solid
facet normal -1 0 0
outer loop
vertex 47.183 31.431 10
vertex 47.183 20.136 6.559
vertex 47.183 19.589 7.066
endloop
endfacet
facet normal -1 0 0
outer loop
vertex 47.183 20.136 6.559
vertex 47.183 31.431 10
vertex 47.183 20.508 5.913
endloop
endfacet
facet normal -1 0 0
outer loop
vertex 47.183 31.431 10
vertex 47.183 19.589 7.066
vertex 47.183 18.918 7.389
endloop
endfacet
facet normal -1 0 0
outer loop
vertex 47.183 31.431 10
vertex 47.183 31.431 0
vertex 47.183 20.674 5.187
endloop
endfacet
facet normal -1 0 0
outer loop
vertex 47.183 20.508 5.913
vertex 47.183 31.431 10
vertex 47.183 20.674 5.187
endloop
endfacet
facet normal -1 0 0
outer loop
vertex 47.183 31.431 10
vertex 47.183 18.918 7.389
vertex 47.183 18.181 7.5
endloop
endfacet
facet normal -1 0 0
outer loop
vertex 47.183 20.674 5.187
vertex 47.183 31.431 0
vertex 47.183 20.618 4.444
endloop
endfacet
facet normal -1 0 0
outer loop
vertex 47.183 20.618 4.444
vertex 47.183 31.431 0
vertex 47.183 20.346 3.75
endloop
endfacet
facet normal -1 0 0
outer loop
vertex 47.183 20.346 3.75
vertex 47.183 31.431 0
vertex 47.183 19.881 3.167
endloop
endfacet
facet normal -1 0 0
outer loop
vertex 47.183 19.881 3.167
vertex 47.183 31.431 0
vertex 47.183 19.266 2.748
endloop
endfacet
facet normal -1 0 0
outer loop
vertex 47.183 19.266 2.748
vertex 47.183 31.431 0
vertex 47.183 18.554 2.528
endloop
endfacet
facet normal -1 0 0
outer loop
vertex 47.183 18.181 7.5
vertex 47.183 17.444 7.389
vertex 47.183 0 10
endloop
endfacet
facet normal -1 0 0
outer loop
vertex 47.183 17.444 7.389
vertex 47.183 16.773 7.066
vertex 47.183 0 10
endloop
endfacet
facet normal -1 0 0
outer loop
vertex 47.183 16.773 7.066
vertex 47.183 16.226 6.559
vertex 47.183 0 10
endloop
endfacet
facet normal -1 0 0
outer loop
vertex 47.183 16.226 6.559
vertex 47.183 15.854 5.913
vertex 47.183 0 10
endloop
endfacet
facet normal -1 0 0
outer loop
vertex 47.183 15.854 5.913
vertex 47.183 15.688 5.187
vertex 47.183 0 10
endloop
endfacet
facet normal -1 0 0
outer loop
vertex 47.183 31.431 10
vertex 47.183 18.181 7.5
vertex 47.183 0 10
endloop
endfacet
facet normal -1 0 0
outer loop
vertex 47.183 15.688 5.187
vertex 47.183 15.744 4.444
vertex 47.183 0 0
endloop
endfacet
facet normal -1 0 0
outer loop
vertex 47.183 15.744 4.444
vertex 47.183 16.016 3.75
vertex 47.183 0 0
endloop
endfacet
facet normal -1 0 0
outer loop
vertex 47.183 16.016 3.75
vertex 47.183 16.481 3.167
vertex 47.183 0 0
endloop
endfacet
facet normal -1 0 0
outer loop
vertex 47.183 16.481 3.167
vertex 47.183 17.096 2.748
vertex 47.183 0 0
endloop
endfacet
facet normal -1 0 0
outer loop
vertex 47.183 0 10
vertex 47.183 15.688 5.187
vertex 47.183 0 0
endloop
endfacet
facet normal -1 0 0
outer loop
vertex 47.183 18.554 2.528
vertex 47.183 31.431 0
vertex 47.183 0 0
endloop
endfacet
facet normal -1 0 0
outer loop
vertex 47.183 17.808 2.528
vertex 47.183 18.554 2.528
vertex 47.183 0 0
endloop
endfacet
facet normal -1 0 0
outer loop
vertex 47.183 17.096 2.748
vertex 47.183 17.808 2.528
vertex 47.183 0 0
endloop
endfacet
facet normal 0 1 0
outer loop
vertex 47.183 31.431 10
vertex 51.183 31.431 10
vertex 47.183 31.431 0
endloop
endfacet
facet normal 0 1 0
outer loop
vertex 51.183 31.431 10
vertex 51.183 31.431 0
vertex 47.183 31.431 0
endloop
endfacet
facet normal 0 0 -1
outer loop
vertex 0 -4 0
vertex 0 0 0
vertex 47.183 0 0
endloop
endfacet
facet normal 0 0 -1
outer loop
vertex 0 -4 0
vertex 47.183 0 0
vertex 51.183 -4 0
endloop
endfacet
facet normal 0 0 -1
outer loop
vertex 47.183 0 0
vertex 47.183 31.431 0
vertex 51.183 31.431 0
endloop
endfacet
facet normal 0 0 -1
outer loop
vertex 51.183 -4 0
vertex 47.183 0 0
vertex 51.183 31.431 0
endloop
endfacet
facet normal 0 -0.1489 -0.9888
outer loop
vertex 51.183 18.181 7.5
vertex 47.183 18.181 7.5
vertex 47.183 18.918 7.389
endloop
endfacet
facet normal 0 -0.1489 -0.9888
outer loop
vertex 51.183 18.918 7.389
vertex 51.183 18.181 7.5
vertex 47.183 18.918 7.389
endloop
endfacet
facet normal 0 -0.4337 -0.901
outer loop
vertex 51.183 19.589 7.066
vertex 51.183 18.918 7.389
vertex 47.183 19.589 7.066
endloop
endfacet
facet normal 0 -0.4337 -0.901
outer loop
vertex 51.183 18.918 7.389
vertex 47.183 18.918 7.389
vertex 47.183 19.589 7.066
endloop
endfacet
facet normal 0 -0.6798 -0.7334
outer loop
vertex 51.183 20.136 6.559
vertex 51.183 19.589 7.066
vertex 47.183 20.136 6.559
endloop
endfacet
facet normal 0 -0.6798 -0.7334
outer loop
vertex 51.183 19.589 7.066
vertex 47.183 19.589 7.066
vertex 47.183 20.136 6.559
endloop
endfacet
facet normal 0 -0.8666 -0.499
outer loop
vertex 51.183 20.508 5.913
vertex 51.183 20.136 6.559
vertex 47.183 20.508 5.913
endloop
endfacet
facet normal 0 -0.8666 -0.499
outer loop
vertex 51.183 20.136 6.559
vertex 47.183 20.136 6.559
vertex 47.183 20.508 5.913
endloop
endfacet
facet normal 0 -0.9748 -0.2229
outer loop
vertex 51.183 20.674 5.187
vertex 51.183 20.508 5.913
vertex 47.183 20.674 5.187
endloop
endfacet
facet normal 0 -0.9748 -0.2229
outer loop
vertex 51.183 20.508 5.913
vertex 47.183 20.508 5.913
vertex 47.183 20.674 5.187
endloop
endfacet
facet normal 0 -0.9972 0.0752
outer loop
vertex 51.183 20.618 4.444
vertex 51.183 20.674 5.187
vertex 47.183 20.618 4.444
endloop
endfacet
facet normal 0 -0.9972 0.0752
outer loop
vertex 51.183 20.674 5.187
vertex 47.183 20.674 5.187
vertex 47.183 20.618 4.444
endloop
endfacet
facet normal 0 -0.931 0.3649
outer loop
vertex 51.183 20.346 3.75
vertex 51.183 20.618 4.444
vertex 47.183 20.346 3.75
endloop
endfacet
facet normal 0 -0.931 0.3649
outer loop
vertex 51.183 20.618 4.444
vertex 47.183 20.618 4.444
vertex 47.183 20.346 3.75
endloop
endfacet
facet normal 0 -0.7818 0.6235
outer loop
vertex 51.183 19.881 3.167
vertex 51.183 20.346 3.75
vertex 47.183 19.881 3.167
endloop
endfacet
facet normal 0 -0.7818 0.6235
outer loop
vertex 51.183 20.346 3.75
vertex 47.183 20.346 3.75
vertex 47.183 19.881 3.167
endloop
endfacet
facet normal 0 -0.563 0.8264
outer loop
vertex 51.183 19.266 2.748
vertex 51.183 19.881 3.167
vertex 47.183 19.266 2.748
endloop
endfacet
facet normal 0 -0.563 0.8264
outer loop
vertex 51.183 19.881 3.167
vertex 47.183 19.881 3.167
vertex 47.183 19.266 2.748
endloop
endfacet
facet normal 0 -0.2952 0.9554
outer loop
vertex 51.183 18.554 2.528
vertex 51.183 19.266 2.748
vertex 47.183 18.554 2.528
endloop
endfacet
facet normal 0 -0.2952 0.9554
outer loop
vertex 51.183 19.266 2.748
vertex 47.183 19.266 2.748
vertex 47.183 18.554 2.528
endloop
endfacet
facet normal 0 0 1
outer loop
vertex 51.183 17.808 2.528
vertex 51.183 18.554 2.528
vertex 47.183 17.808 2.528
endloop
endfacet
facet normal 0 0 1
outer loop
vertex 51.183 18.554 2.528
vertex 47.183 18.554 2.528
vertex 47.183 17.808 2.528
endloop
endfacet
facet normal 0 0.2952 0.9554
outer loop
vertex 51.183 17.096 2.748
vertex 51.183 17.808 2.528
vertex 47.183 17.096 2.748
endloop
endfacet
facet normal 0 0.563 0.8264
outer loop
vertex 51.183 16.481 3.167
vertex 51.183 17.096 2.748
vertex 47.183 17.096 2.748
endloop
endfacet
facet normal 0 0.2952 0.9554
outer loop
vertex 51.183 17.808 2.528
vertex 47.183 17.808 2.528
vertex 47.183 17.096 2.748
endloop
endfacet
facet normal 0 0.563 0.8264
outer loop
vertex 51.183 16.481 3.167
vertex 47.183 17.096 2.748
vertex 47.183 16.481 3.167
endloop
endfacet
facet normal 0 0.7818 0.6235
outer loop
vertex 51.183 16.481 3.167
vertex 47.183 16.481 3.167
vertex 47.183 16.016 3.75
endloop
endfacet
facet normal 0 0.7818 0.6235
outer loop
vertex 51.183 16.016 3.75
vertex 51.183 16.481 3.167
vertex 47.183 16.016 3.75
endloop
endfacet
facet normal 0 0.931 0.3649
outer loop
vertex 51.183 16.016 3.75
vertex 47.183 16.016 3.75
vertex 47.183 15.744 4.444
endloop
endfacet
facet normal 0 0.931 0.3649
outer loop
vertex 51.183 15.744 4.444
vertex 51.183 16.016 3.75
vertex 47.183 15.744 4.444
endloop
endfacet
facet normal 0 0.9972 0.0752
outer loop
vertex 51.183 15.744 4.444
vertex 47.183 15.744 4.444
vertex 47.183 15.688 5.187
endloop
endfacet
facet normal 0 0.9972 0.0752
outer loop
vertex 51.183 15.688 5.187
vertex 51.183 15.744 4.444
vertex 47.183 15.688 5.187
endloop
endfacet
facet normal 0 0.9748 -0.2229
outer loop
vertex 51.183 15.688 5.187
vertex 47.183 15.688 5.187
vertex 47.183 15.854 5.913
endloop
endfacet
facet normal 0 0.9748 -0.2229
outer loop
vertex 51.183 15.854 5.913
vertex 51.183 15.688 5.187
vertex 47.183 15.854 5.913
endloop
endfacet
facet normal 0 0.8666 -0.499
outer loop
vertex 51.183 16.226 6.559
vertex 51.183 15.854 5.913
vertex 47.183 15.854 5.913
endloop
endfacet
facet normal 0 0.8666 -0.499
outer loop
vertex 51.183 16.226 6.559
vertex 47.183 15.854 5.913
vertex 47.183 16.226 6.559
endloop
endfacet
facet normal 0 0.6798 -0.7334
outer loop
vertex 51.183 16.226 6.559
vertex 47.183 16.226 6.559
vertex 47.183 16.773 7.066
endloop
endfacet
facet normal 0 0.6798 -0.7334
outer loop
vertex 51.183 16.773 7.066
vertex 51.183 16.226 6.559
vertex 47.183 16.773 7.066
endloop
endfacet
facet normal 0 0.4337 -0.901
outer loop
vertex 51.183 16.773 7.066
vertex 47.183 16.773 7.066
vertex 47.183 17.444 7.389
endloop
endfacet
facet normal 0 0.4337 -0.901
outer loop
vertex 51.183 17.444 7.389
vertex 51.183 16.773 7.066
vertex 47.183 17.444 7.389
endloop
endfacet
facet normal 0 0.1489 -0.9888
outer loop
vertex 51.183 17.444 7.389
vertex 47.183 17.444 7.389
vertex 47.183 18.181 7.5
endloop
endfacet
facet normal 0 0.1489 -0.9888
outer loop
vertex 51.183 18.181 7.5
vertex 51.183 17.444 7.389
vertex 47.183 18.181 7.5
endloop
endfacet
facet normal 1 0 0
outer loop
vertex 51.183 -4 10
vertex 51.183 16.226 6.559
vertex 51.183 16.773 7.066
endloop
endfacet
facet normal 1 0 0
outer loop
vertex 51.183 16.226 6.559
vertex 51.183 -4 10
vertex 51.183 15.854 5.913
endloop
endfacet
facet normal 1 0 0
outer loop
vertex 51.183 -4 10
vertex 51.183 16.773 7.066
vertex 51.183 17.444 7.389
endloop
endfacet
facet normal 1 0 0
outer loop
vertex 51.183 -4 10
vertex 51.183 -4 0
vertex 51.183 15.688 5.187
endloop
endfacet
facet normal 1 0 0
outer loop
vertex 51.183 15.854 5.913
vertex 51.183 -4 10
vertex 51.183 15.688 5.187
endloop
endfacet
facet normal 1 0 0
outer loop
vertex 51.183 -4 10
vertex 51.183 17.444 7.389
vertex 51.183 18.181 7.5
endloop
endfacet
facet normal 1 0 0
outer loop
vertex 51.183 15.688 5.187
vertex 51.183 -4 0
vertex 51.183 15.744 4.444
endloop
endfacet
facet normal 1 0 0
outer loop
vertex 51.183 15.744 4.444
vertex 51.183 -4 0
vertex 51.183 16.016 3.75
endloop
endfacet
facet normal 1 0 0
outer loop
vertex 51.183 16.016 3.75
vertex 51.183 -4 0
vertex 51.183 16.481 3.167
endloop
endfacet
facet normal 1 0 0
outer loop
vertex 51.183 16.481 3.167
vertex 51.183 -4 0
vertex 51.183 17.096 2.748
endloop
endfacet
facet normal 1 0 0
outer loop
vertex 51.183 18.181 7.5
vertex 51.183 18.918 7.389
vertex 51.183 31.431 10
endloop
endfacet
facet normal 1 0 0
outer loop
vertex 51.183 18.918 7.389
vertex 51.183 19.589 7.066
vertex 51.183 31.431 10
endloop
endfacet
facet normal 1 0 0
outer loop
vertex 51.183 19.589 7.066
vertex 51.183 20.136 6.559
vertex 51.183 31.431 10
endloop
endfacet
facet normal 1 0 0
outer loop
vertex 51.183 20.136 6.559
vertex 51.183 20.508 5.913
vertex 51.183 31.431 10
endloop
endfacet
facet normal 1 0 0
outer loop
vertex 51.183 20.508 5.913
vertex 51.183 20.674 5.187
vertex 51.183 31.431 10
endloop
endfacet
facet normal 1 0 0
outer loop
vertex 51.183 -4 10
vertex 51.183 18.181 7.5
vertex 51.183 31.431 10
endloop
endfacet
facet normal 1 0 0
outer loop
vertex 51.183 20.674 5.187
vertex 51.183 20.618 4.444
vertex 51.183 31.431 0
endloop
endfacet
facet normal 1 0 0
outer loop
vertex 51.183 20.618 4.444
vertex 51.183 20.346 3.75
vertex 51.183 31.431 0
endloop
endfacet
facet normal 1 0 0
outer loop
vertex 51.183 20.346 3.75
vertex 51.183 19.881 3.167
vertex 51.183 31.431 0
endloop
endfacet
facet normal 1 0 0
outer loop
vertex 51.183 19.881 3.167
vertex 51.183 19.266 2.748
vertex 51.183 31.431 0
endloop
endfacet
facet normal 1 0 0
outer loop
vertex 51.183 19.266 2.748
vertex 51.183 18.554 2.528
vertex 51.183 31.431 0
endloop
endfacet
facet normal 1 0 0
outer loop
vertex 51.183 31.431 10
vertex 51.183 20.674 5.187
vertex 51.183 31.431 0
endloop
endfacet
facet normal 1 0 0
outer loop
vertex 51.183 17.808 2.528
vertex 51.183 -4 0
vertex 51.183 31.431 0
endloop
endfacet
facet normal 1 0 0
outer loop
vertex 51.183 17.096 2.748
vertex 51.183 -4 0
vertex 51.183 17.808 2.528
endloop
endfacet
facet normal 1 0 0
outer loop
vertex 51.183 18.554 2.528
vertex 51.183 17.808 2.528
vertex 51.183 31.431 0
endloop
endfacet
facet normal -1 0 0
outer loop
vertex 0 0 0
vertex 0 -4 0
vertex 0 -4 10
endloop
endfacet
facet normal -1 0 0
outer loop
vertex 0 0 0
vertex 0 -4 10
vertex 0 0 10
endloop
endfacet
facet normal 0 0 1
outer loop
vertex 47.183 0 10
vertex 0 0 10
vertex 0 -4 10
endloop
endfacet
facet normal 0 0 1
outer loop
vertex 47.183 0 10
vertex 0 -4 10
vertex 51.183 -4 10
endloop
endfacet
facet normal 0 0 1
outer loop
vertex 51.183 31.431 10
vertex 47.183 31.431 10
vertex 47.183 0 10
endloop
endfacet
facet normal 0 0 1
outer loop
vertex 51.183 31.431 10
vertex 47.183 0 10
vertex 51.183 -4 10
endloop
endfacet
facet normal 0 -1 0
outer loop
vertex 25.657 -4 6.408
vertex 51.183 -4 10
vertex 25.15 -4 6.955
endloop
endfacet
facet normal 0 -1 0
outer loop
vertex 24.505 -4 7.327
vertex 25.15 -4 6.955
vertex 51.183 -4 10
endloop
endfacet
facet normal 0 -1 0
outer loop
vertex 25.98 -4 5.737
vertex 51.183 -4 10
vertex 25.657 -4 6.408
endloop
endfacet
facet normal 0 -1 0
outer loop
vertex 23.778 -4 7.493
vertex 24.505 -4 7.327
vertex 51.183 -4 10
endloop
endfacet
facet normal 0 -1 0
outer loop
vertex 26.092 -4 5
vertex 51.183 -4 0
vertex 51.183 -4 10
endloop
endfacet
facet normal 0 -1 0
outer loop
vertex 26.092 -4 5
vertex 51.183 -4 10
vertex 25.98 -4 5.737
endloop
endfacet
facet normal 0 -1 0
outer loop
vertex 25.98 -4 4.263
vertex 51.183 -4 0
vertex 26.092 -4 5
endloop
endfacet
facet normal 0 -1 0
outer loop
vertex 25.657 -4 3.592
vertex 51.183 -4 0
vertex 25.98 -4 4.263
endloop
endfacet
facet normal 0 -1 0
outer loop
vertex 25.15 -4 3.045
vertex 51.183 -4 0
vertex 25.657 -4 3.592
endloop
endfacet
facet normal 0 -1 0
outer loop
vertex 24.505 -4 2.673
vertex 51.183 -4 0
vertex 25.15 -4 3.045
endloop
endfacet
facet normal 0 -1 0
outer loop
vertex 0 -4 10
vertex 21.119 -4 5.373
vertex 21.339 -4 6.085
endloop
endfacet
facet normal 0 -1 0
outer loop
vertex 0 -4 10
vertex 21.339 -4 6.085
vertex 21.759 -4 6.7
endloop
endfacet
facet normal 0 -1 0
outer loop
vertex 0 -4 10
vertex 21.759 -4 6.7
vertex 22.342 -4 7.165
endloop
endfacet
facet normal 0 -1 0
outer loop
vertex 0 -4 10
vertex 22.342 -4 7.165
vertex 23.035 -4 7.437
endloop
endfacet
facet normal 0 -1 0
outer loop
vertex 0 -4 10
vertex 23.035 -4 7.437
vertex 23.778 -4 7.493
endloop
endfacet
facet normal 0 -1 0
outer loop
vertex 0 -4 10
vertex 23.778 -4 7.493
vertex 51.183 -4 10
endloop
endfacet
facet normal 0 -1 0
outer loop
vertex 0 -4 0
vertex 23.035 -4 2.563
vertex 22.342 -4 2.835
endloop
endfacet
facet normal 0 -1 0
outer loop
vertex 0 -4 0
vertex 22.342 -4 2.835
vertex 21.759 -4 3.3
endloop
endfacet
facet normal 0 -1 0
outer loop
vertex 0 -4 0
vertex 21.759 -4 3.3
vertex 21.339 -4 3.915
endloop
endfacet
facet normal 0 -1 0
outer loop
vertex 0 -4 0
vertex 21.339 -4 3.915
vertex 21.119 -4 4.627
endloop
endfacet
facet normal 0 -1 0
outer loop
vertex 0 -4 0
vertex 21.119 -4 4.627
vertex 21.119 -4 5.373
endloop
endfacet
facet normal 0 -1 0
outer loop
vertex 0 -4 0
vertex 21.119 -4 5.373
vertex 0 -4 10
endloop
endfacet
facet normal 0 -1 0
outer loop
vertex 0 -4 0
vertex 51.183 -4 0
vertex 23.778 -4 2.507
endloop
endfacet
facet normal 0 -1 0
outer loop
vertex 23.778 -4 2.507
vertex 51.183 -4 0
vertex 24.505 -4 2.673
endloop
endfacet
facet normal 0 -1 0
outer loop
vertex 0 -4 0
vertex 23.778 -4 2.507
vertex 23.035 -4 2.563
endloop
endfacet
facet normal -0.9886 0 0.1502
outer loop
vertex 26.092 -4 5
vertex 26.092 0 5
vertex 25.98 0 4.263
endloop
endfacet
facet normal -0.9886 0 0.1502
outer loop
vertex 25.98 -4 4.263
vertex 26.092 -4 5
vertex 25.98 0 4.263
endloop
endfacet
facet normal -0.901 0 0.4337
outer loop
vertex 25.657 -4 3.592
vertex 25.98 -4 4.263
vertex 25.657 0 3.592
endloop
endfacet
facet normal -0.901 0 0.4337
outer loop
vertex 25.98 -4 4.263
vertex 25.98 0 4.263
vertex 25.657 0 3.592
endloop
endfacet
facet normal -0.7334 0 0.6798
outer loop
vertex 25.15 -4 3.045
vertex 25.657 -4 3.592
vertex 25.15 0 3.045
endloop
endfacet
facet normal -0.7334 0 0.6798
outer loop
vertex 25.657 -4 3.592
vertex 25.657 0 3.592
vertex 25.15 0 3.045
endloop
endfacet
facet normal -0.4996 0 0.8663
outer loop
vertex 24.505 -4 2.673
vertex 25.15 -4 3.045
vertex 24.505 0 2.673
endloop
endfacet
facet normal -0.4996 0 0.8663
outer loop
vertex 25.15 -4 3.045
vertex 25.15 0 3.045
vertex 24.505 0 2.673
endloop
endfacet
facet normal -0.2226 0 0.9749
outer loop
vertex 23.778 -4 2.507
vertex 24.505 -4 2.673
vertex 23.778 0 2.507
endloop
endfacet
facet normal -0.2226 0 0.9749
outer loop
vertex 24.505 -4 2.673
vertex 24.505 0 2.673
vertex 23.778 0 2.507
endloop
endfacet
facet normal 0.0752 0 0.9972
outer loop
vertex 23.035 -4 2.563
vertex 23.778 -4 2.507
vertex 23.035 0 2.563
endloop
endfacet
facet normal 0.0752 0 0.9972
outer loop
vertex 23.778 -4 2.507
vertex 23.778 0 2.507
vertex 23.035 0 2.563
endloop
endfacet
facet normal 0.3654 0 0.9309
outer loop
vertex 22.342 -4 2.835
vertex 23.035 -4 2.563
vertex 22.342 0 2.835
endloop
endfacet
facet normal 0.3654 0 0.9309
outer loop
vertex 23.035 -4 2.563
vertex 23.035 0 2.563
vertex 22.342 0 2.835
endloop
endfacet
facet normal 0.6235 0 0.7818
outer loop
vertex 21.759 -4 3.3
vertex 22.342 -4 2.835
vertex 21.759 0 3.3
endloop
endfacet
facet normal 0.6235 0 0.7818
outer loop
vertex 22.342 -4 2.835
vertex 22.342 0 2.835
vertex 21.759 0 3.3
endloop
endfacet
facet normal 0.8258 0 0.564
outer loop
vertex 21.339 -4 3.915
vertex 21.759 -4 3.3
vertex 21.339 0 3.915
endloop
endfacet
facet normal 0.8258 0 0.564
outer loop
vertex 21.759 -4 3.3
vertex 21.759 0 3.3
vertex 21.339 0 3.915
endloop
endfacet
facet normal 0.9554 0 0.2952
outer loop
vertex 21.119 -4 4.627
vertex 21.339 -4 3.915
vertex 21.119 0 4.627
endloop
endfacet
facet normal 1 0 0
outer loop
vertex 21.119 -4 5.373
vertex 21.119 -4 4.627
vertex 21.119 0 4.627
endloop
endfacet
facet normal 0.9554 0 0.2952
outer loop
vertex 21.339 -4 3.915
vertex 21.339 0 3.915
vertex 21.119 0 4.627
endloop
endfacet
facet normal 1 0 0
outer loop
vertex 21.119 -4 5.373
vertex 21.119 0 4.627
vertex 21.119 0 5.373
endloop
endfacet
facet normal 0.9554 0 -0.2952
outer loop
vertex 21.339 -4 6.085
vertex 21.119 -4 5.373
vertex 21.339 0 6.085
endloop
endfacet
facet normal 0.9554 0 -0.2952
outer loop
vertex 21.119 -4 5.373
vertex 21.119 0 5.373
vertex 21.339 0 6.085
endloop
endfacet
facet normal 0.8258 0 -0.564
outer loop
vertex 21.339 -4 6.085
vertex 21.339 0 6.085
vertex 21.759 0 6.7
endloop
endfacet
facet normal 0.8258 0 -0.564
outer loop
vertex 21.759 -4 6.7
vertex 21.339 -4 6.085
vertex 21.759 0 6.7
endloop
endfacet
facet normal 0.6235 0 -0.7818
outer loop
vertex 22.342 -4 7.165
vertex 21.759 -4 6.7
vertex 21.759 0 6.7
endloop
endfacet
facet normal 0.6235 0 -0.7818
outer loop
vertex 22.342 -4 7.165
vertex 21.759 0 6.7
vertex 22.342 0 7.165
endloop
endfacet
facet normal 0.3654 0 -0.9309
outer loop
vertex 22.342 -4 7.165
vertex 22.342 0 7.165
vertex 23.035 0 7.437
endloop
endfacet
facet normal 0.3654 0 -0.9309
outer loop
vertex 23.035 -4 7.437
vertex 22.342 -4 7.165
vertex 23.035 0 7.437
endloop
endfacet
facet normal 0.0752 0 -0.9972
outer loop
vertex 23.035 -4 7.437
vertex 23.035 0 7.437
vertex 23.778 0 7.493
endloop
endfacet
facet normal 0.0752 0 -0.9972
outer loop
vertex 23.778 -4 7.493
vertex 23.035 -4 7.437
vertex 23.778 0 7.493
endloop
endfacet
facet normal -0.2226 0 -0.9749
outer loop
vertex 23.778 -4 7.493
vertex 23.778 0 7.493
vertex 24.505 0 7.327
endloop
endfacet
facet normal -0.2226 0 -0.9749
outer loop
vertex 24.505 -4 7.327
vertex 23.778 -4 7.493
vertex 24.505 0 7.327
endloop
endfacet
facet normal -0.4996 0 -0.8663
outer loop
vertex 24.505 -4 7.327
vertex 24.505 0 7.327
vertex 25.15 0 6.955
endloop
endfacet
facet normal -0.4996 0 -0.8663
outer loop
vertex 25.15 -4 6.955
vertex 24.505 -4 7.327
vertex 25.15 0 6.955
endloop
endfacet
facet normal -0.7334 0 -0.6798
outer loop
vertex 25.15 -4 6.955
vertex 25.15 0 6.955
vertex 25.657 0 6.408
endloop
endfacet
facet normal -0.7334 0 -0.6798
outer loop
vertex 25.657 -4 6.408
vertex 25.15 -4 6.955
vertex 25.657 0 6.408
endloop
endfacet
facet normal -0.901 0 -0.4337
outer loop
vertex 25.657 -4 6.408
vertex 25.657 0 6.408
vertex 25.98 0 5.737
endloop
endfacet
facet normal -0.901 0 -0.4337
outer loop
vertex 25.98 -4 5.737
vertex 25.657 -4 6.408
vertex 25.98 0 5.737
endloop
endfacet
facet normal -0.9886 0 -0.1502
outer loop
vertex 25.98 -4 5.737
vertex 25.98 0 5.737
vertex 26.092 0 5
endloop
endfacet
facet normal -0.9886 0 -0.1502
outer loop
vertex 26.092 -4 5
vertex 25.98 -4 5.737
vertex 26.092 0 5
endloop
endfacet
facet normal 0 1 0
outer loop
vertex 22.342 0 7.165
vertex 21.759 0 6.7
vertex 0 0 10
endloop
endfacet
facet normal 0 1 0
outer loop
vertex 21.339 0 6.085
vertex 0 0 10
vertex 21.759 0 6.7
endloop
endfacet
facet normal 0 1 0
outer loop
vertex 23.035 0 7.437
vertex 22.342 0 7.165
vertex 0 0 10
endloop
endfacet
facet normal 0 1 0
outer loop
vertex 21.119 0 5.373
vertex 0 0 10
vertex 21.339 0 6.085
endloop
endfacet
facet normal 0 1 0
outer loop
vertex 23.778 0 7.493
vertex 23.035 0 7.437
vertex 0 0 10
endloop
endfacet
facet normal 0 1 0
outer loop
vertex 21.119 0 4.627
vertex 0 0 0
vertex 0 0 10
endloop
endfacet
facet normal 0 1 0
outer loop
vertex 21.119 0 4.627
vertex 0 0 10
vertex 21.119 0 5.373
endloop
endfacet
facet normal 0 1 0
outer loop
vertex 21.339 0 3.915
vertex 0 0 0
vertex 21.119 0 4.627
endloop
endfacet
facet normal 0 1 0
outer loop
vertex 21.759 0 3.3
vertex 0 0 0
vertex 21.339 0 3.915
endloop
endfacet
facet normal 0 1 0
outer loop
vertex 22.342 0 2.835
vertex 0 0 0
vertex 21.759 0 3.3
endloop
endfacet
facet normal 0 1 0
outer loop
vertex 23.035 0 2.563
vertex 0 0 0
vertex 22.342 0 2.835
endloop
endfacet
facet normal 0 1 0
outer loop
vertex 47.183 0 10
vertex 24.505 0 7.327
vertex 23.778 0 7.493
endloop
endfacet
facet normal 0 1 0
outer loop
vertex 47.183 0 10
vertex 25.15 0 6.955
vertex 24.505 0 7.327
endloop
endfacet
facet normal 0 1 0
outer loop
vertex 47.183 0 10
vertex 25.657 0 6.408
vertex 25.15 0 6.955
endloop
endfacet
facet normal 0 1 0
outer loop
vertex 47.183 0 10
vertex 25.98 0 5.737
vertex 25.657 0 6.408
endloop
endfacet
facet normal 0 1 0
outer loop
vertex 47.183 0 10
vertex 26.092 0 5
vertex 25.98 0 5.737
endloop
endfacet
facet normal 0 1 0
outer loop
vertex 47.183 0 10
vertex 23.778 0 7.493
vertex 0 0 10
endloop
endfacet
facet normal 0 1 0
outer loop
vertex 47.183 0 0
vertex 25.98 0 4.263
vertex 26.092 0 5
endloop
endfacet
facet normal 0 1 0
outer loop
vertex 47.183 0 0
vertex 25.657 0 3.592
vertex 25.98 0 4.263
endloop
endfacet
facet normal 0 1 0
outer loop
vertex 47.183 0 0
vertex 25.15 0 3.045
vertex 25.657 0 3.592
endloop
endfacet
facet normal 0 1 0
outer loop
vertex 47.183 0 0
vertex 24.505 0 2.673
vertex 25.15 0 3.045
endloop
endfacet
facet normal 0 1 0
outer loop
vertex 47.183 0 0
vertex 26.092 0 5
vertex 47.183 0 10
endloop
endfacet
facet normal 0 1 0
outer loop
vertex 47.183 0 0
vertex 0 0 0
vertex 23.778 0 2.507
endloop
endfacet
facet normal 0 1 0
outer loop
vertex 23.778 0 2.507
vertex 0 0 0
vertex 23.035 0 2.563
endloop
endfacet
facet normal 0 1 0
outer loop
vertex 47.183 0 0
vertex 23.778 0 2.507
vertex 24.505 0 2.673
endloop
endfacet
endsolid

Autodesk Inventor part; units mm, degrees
ref_plane "YZ Plane" through (0, 0, 0) normal (1, 0, 0) x (0, 1, 0)
ref_plane "XZ Plane" through (0, 0, 0) normal (0, 1, 0) x (-1, 0, 0)
ref_plane "XY Plane" through (0, 0, 0) normal (0, 0, 1) x (1, 0, 0)
sketch "스케치1" plane through (0, 0, 0) normal (0, 0, 1) x (1, 0, 0)
  line L0 (0, 0) -> (47.183, 0)
  line L1 (47.183, 0) -> (47.183, -4)
  line L2 (47.183, -4) -> (0, -4)
  line L3 (0, -4) -> (0, 0)
  line L4 (47.183, -4) -> (51.183, -4)
  line L5 (51.183, -4) -> (51.183, 31.431)
  line L6 (51.183, 31.431) -> (47.183, 31.431)
  line L7 (47.183, 31.431) -> (47.183, -4)
  point P0 (47.183, 0)
  dimension "d0" = 47.183
  dimension "d1" = 31.431
  dimension "d2" = 4
  dimension "d3" = 4
extrude "돌출1" add sketch "스케치1" along normal blind 10
sketch "스케치2" plane through (0, 0, 0) normal (0, 1, 0) x (1, 0, 0)
  line L0 (0, 0) -> (0, -10) projected
  line L1 (0, -5) -> (47.183, -5) construction
  line L2 (47.183, 0) -> (47.183, -10) projected
  circle A0 centre (23.5915, -5) radius 2.5
  dimension "d6" = 5
extrude "돌출2" cut sketch "스케치2" against normal blind 9.25
sketch "스케치3" plane through (47.183, 0, 0) normal (-1, 0, 0) x (0, 0, 1)
  line L0 (0, 31.431) -> (10, 31.431) projected
  line L1 (5, 31.431) -> (5, 4.931)
  circle A0 centre (5, 18.181) radius 2.5
  point P0 (0, 0)
  dimension "d9" = 5
extrude "돌출3" cut sketch "스케치3" against normal blind 8.75
properties part number "베벨기어 003"
